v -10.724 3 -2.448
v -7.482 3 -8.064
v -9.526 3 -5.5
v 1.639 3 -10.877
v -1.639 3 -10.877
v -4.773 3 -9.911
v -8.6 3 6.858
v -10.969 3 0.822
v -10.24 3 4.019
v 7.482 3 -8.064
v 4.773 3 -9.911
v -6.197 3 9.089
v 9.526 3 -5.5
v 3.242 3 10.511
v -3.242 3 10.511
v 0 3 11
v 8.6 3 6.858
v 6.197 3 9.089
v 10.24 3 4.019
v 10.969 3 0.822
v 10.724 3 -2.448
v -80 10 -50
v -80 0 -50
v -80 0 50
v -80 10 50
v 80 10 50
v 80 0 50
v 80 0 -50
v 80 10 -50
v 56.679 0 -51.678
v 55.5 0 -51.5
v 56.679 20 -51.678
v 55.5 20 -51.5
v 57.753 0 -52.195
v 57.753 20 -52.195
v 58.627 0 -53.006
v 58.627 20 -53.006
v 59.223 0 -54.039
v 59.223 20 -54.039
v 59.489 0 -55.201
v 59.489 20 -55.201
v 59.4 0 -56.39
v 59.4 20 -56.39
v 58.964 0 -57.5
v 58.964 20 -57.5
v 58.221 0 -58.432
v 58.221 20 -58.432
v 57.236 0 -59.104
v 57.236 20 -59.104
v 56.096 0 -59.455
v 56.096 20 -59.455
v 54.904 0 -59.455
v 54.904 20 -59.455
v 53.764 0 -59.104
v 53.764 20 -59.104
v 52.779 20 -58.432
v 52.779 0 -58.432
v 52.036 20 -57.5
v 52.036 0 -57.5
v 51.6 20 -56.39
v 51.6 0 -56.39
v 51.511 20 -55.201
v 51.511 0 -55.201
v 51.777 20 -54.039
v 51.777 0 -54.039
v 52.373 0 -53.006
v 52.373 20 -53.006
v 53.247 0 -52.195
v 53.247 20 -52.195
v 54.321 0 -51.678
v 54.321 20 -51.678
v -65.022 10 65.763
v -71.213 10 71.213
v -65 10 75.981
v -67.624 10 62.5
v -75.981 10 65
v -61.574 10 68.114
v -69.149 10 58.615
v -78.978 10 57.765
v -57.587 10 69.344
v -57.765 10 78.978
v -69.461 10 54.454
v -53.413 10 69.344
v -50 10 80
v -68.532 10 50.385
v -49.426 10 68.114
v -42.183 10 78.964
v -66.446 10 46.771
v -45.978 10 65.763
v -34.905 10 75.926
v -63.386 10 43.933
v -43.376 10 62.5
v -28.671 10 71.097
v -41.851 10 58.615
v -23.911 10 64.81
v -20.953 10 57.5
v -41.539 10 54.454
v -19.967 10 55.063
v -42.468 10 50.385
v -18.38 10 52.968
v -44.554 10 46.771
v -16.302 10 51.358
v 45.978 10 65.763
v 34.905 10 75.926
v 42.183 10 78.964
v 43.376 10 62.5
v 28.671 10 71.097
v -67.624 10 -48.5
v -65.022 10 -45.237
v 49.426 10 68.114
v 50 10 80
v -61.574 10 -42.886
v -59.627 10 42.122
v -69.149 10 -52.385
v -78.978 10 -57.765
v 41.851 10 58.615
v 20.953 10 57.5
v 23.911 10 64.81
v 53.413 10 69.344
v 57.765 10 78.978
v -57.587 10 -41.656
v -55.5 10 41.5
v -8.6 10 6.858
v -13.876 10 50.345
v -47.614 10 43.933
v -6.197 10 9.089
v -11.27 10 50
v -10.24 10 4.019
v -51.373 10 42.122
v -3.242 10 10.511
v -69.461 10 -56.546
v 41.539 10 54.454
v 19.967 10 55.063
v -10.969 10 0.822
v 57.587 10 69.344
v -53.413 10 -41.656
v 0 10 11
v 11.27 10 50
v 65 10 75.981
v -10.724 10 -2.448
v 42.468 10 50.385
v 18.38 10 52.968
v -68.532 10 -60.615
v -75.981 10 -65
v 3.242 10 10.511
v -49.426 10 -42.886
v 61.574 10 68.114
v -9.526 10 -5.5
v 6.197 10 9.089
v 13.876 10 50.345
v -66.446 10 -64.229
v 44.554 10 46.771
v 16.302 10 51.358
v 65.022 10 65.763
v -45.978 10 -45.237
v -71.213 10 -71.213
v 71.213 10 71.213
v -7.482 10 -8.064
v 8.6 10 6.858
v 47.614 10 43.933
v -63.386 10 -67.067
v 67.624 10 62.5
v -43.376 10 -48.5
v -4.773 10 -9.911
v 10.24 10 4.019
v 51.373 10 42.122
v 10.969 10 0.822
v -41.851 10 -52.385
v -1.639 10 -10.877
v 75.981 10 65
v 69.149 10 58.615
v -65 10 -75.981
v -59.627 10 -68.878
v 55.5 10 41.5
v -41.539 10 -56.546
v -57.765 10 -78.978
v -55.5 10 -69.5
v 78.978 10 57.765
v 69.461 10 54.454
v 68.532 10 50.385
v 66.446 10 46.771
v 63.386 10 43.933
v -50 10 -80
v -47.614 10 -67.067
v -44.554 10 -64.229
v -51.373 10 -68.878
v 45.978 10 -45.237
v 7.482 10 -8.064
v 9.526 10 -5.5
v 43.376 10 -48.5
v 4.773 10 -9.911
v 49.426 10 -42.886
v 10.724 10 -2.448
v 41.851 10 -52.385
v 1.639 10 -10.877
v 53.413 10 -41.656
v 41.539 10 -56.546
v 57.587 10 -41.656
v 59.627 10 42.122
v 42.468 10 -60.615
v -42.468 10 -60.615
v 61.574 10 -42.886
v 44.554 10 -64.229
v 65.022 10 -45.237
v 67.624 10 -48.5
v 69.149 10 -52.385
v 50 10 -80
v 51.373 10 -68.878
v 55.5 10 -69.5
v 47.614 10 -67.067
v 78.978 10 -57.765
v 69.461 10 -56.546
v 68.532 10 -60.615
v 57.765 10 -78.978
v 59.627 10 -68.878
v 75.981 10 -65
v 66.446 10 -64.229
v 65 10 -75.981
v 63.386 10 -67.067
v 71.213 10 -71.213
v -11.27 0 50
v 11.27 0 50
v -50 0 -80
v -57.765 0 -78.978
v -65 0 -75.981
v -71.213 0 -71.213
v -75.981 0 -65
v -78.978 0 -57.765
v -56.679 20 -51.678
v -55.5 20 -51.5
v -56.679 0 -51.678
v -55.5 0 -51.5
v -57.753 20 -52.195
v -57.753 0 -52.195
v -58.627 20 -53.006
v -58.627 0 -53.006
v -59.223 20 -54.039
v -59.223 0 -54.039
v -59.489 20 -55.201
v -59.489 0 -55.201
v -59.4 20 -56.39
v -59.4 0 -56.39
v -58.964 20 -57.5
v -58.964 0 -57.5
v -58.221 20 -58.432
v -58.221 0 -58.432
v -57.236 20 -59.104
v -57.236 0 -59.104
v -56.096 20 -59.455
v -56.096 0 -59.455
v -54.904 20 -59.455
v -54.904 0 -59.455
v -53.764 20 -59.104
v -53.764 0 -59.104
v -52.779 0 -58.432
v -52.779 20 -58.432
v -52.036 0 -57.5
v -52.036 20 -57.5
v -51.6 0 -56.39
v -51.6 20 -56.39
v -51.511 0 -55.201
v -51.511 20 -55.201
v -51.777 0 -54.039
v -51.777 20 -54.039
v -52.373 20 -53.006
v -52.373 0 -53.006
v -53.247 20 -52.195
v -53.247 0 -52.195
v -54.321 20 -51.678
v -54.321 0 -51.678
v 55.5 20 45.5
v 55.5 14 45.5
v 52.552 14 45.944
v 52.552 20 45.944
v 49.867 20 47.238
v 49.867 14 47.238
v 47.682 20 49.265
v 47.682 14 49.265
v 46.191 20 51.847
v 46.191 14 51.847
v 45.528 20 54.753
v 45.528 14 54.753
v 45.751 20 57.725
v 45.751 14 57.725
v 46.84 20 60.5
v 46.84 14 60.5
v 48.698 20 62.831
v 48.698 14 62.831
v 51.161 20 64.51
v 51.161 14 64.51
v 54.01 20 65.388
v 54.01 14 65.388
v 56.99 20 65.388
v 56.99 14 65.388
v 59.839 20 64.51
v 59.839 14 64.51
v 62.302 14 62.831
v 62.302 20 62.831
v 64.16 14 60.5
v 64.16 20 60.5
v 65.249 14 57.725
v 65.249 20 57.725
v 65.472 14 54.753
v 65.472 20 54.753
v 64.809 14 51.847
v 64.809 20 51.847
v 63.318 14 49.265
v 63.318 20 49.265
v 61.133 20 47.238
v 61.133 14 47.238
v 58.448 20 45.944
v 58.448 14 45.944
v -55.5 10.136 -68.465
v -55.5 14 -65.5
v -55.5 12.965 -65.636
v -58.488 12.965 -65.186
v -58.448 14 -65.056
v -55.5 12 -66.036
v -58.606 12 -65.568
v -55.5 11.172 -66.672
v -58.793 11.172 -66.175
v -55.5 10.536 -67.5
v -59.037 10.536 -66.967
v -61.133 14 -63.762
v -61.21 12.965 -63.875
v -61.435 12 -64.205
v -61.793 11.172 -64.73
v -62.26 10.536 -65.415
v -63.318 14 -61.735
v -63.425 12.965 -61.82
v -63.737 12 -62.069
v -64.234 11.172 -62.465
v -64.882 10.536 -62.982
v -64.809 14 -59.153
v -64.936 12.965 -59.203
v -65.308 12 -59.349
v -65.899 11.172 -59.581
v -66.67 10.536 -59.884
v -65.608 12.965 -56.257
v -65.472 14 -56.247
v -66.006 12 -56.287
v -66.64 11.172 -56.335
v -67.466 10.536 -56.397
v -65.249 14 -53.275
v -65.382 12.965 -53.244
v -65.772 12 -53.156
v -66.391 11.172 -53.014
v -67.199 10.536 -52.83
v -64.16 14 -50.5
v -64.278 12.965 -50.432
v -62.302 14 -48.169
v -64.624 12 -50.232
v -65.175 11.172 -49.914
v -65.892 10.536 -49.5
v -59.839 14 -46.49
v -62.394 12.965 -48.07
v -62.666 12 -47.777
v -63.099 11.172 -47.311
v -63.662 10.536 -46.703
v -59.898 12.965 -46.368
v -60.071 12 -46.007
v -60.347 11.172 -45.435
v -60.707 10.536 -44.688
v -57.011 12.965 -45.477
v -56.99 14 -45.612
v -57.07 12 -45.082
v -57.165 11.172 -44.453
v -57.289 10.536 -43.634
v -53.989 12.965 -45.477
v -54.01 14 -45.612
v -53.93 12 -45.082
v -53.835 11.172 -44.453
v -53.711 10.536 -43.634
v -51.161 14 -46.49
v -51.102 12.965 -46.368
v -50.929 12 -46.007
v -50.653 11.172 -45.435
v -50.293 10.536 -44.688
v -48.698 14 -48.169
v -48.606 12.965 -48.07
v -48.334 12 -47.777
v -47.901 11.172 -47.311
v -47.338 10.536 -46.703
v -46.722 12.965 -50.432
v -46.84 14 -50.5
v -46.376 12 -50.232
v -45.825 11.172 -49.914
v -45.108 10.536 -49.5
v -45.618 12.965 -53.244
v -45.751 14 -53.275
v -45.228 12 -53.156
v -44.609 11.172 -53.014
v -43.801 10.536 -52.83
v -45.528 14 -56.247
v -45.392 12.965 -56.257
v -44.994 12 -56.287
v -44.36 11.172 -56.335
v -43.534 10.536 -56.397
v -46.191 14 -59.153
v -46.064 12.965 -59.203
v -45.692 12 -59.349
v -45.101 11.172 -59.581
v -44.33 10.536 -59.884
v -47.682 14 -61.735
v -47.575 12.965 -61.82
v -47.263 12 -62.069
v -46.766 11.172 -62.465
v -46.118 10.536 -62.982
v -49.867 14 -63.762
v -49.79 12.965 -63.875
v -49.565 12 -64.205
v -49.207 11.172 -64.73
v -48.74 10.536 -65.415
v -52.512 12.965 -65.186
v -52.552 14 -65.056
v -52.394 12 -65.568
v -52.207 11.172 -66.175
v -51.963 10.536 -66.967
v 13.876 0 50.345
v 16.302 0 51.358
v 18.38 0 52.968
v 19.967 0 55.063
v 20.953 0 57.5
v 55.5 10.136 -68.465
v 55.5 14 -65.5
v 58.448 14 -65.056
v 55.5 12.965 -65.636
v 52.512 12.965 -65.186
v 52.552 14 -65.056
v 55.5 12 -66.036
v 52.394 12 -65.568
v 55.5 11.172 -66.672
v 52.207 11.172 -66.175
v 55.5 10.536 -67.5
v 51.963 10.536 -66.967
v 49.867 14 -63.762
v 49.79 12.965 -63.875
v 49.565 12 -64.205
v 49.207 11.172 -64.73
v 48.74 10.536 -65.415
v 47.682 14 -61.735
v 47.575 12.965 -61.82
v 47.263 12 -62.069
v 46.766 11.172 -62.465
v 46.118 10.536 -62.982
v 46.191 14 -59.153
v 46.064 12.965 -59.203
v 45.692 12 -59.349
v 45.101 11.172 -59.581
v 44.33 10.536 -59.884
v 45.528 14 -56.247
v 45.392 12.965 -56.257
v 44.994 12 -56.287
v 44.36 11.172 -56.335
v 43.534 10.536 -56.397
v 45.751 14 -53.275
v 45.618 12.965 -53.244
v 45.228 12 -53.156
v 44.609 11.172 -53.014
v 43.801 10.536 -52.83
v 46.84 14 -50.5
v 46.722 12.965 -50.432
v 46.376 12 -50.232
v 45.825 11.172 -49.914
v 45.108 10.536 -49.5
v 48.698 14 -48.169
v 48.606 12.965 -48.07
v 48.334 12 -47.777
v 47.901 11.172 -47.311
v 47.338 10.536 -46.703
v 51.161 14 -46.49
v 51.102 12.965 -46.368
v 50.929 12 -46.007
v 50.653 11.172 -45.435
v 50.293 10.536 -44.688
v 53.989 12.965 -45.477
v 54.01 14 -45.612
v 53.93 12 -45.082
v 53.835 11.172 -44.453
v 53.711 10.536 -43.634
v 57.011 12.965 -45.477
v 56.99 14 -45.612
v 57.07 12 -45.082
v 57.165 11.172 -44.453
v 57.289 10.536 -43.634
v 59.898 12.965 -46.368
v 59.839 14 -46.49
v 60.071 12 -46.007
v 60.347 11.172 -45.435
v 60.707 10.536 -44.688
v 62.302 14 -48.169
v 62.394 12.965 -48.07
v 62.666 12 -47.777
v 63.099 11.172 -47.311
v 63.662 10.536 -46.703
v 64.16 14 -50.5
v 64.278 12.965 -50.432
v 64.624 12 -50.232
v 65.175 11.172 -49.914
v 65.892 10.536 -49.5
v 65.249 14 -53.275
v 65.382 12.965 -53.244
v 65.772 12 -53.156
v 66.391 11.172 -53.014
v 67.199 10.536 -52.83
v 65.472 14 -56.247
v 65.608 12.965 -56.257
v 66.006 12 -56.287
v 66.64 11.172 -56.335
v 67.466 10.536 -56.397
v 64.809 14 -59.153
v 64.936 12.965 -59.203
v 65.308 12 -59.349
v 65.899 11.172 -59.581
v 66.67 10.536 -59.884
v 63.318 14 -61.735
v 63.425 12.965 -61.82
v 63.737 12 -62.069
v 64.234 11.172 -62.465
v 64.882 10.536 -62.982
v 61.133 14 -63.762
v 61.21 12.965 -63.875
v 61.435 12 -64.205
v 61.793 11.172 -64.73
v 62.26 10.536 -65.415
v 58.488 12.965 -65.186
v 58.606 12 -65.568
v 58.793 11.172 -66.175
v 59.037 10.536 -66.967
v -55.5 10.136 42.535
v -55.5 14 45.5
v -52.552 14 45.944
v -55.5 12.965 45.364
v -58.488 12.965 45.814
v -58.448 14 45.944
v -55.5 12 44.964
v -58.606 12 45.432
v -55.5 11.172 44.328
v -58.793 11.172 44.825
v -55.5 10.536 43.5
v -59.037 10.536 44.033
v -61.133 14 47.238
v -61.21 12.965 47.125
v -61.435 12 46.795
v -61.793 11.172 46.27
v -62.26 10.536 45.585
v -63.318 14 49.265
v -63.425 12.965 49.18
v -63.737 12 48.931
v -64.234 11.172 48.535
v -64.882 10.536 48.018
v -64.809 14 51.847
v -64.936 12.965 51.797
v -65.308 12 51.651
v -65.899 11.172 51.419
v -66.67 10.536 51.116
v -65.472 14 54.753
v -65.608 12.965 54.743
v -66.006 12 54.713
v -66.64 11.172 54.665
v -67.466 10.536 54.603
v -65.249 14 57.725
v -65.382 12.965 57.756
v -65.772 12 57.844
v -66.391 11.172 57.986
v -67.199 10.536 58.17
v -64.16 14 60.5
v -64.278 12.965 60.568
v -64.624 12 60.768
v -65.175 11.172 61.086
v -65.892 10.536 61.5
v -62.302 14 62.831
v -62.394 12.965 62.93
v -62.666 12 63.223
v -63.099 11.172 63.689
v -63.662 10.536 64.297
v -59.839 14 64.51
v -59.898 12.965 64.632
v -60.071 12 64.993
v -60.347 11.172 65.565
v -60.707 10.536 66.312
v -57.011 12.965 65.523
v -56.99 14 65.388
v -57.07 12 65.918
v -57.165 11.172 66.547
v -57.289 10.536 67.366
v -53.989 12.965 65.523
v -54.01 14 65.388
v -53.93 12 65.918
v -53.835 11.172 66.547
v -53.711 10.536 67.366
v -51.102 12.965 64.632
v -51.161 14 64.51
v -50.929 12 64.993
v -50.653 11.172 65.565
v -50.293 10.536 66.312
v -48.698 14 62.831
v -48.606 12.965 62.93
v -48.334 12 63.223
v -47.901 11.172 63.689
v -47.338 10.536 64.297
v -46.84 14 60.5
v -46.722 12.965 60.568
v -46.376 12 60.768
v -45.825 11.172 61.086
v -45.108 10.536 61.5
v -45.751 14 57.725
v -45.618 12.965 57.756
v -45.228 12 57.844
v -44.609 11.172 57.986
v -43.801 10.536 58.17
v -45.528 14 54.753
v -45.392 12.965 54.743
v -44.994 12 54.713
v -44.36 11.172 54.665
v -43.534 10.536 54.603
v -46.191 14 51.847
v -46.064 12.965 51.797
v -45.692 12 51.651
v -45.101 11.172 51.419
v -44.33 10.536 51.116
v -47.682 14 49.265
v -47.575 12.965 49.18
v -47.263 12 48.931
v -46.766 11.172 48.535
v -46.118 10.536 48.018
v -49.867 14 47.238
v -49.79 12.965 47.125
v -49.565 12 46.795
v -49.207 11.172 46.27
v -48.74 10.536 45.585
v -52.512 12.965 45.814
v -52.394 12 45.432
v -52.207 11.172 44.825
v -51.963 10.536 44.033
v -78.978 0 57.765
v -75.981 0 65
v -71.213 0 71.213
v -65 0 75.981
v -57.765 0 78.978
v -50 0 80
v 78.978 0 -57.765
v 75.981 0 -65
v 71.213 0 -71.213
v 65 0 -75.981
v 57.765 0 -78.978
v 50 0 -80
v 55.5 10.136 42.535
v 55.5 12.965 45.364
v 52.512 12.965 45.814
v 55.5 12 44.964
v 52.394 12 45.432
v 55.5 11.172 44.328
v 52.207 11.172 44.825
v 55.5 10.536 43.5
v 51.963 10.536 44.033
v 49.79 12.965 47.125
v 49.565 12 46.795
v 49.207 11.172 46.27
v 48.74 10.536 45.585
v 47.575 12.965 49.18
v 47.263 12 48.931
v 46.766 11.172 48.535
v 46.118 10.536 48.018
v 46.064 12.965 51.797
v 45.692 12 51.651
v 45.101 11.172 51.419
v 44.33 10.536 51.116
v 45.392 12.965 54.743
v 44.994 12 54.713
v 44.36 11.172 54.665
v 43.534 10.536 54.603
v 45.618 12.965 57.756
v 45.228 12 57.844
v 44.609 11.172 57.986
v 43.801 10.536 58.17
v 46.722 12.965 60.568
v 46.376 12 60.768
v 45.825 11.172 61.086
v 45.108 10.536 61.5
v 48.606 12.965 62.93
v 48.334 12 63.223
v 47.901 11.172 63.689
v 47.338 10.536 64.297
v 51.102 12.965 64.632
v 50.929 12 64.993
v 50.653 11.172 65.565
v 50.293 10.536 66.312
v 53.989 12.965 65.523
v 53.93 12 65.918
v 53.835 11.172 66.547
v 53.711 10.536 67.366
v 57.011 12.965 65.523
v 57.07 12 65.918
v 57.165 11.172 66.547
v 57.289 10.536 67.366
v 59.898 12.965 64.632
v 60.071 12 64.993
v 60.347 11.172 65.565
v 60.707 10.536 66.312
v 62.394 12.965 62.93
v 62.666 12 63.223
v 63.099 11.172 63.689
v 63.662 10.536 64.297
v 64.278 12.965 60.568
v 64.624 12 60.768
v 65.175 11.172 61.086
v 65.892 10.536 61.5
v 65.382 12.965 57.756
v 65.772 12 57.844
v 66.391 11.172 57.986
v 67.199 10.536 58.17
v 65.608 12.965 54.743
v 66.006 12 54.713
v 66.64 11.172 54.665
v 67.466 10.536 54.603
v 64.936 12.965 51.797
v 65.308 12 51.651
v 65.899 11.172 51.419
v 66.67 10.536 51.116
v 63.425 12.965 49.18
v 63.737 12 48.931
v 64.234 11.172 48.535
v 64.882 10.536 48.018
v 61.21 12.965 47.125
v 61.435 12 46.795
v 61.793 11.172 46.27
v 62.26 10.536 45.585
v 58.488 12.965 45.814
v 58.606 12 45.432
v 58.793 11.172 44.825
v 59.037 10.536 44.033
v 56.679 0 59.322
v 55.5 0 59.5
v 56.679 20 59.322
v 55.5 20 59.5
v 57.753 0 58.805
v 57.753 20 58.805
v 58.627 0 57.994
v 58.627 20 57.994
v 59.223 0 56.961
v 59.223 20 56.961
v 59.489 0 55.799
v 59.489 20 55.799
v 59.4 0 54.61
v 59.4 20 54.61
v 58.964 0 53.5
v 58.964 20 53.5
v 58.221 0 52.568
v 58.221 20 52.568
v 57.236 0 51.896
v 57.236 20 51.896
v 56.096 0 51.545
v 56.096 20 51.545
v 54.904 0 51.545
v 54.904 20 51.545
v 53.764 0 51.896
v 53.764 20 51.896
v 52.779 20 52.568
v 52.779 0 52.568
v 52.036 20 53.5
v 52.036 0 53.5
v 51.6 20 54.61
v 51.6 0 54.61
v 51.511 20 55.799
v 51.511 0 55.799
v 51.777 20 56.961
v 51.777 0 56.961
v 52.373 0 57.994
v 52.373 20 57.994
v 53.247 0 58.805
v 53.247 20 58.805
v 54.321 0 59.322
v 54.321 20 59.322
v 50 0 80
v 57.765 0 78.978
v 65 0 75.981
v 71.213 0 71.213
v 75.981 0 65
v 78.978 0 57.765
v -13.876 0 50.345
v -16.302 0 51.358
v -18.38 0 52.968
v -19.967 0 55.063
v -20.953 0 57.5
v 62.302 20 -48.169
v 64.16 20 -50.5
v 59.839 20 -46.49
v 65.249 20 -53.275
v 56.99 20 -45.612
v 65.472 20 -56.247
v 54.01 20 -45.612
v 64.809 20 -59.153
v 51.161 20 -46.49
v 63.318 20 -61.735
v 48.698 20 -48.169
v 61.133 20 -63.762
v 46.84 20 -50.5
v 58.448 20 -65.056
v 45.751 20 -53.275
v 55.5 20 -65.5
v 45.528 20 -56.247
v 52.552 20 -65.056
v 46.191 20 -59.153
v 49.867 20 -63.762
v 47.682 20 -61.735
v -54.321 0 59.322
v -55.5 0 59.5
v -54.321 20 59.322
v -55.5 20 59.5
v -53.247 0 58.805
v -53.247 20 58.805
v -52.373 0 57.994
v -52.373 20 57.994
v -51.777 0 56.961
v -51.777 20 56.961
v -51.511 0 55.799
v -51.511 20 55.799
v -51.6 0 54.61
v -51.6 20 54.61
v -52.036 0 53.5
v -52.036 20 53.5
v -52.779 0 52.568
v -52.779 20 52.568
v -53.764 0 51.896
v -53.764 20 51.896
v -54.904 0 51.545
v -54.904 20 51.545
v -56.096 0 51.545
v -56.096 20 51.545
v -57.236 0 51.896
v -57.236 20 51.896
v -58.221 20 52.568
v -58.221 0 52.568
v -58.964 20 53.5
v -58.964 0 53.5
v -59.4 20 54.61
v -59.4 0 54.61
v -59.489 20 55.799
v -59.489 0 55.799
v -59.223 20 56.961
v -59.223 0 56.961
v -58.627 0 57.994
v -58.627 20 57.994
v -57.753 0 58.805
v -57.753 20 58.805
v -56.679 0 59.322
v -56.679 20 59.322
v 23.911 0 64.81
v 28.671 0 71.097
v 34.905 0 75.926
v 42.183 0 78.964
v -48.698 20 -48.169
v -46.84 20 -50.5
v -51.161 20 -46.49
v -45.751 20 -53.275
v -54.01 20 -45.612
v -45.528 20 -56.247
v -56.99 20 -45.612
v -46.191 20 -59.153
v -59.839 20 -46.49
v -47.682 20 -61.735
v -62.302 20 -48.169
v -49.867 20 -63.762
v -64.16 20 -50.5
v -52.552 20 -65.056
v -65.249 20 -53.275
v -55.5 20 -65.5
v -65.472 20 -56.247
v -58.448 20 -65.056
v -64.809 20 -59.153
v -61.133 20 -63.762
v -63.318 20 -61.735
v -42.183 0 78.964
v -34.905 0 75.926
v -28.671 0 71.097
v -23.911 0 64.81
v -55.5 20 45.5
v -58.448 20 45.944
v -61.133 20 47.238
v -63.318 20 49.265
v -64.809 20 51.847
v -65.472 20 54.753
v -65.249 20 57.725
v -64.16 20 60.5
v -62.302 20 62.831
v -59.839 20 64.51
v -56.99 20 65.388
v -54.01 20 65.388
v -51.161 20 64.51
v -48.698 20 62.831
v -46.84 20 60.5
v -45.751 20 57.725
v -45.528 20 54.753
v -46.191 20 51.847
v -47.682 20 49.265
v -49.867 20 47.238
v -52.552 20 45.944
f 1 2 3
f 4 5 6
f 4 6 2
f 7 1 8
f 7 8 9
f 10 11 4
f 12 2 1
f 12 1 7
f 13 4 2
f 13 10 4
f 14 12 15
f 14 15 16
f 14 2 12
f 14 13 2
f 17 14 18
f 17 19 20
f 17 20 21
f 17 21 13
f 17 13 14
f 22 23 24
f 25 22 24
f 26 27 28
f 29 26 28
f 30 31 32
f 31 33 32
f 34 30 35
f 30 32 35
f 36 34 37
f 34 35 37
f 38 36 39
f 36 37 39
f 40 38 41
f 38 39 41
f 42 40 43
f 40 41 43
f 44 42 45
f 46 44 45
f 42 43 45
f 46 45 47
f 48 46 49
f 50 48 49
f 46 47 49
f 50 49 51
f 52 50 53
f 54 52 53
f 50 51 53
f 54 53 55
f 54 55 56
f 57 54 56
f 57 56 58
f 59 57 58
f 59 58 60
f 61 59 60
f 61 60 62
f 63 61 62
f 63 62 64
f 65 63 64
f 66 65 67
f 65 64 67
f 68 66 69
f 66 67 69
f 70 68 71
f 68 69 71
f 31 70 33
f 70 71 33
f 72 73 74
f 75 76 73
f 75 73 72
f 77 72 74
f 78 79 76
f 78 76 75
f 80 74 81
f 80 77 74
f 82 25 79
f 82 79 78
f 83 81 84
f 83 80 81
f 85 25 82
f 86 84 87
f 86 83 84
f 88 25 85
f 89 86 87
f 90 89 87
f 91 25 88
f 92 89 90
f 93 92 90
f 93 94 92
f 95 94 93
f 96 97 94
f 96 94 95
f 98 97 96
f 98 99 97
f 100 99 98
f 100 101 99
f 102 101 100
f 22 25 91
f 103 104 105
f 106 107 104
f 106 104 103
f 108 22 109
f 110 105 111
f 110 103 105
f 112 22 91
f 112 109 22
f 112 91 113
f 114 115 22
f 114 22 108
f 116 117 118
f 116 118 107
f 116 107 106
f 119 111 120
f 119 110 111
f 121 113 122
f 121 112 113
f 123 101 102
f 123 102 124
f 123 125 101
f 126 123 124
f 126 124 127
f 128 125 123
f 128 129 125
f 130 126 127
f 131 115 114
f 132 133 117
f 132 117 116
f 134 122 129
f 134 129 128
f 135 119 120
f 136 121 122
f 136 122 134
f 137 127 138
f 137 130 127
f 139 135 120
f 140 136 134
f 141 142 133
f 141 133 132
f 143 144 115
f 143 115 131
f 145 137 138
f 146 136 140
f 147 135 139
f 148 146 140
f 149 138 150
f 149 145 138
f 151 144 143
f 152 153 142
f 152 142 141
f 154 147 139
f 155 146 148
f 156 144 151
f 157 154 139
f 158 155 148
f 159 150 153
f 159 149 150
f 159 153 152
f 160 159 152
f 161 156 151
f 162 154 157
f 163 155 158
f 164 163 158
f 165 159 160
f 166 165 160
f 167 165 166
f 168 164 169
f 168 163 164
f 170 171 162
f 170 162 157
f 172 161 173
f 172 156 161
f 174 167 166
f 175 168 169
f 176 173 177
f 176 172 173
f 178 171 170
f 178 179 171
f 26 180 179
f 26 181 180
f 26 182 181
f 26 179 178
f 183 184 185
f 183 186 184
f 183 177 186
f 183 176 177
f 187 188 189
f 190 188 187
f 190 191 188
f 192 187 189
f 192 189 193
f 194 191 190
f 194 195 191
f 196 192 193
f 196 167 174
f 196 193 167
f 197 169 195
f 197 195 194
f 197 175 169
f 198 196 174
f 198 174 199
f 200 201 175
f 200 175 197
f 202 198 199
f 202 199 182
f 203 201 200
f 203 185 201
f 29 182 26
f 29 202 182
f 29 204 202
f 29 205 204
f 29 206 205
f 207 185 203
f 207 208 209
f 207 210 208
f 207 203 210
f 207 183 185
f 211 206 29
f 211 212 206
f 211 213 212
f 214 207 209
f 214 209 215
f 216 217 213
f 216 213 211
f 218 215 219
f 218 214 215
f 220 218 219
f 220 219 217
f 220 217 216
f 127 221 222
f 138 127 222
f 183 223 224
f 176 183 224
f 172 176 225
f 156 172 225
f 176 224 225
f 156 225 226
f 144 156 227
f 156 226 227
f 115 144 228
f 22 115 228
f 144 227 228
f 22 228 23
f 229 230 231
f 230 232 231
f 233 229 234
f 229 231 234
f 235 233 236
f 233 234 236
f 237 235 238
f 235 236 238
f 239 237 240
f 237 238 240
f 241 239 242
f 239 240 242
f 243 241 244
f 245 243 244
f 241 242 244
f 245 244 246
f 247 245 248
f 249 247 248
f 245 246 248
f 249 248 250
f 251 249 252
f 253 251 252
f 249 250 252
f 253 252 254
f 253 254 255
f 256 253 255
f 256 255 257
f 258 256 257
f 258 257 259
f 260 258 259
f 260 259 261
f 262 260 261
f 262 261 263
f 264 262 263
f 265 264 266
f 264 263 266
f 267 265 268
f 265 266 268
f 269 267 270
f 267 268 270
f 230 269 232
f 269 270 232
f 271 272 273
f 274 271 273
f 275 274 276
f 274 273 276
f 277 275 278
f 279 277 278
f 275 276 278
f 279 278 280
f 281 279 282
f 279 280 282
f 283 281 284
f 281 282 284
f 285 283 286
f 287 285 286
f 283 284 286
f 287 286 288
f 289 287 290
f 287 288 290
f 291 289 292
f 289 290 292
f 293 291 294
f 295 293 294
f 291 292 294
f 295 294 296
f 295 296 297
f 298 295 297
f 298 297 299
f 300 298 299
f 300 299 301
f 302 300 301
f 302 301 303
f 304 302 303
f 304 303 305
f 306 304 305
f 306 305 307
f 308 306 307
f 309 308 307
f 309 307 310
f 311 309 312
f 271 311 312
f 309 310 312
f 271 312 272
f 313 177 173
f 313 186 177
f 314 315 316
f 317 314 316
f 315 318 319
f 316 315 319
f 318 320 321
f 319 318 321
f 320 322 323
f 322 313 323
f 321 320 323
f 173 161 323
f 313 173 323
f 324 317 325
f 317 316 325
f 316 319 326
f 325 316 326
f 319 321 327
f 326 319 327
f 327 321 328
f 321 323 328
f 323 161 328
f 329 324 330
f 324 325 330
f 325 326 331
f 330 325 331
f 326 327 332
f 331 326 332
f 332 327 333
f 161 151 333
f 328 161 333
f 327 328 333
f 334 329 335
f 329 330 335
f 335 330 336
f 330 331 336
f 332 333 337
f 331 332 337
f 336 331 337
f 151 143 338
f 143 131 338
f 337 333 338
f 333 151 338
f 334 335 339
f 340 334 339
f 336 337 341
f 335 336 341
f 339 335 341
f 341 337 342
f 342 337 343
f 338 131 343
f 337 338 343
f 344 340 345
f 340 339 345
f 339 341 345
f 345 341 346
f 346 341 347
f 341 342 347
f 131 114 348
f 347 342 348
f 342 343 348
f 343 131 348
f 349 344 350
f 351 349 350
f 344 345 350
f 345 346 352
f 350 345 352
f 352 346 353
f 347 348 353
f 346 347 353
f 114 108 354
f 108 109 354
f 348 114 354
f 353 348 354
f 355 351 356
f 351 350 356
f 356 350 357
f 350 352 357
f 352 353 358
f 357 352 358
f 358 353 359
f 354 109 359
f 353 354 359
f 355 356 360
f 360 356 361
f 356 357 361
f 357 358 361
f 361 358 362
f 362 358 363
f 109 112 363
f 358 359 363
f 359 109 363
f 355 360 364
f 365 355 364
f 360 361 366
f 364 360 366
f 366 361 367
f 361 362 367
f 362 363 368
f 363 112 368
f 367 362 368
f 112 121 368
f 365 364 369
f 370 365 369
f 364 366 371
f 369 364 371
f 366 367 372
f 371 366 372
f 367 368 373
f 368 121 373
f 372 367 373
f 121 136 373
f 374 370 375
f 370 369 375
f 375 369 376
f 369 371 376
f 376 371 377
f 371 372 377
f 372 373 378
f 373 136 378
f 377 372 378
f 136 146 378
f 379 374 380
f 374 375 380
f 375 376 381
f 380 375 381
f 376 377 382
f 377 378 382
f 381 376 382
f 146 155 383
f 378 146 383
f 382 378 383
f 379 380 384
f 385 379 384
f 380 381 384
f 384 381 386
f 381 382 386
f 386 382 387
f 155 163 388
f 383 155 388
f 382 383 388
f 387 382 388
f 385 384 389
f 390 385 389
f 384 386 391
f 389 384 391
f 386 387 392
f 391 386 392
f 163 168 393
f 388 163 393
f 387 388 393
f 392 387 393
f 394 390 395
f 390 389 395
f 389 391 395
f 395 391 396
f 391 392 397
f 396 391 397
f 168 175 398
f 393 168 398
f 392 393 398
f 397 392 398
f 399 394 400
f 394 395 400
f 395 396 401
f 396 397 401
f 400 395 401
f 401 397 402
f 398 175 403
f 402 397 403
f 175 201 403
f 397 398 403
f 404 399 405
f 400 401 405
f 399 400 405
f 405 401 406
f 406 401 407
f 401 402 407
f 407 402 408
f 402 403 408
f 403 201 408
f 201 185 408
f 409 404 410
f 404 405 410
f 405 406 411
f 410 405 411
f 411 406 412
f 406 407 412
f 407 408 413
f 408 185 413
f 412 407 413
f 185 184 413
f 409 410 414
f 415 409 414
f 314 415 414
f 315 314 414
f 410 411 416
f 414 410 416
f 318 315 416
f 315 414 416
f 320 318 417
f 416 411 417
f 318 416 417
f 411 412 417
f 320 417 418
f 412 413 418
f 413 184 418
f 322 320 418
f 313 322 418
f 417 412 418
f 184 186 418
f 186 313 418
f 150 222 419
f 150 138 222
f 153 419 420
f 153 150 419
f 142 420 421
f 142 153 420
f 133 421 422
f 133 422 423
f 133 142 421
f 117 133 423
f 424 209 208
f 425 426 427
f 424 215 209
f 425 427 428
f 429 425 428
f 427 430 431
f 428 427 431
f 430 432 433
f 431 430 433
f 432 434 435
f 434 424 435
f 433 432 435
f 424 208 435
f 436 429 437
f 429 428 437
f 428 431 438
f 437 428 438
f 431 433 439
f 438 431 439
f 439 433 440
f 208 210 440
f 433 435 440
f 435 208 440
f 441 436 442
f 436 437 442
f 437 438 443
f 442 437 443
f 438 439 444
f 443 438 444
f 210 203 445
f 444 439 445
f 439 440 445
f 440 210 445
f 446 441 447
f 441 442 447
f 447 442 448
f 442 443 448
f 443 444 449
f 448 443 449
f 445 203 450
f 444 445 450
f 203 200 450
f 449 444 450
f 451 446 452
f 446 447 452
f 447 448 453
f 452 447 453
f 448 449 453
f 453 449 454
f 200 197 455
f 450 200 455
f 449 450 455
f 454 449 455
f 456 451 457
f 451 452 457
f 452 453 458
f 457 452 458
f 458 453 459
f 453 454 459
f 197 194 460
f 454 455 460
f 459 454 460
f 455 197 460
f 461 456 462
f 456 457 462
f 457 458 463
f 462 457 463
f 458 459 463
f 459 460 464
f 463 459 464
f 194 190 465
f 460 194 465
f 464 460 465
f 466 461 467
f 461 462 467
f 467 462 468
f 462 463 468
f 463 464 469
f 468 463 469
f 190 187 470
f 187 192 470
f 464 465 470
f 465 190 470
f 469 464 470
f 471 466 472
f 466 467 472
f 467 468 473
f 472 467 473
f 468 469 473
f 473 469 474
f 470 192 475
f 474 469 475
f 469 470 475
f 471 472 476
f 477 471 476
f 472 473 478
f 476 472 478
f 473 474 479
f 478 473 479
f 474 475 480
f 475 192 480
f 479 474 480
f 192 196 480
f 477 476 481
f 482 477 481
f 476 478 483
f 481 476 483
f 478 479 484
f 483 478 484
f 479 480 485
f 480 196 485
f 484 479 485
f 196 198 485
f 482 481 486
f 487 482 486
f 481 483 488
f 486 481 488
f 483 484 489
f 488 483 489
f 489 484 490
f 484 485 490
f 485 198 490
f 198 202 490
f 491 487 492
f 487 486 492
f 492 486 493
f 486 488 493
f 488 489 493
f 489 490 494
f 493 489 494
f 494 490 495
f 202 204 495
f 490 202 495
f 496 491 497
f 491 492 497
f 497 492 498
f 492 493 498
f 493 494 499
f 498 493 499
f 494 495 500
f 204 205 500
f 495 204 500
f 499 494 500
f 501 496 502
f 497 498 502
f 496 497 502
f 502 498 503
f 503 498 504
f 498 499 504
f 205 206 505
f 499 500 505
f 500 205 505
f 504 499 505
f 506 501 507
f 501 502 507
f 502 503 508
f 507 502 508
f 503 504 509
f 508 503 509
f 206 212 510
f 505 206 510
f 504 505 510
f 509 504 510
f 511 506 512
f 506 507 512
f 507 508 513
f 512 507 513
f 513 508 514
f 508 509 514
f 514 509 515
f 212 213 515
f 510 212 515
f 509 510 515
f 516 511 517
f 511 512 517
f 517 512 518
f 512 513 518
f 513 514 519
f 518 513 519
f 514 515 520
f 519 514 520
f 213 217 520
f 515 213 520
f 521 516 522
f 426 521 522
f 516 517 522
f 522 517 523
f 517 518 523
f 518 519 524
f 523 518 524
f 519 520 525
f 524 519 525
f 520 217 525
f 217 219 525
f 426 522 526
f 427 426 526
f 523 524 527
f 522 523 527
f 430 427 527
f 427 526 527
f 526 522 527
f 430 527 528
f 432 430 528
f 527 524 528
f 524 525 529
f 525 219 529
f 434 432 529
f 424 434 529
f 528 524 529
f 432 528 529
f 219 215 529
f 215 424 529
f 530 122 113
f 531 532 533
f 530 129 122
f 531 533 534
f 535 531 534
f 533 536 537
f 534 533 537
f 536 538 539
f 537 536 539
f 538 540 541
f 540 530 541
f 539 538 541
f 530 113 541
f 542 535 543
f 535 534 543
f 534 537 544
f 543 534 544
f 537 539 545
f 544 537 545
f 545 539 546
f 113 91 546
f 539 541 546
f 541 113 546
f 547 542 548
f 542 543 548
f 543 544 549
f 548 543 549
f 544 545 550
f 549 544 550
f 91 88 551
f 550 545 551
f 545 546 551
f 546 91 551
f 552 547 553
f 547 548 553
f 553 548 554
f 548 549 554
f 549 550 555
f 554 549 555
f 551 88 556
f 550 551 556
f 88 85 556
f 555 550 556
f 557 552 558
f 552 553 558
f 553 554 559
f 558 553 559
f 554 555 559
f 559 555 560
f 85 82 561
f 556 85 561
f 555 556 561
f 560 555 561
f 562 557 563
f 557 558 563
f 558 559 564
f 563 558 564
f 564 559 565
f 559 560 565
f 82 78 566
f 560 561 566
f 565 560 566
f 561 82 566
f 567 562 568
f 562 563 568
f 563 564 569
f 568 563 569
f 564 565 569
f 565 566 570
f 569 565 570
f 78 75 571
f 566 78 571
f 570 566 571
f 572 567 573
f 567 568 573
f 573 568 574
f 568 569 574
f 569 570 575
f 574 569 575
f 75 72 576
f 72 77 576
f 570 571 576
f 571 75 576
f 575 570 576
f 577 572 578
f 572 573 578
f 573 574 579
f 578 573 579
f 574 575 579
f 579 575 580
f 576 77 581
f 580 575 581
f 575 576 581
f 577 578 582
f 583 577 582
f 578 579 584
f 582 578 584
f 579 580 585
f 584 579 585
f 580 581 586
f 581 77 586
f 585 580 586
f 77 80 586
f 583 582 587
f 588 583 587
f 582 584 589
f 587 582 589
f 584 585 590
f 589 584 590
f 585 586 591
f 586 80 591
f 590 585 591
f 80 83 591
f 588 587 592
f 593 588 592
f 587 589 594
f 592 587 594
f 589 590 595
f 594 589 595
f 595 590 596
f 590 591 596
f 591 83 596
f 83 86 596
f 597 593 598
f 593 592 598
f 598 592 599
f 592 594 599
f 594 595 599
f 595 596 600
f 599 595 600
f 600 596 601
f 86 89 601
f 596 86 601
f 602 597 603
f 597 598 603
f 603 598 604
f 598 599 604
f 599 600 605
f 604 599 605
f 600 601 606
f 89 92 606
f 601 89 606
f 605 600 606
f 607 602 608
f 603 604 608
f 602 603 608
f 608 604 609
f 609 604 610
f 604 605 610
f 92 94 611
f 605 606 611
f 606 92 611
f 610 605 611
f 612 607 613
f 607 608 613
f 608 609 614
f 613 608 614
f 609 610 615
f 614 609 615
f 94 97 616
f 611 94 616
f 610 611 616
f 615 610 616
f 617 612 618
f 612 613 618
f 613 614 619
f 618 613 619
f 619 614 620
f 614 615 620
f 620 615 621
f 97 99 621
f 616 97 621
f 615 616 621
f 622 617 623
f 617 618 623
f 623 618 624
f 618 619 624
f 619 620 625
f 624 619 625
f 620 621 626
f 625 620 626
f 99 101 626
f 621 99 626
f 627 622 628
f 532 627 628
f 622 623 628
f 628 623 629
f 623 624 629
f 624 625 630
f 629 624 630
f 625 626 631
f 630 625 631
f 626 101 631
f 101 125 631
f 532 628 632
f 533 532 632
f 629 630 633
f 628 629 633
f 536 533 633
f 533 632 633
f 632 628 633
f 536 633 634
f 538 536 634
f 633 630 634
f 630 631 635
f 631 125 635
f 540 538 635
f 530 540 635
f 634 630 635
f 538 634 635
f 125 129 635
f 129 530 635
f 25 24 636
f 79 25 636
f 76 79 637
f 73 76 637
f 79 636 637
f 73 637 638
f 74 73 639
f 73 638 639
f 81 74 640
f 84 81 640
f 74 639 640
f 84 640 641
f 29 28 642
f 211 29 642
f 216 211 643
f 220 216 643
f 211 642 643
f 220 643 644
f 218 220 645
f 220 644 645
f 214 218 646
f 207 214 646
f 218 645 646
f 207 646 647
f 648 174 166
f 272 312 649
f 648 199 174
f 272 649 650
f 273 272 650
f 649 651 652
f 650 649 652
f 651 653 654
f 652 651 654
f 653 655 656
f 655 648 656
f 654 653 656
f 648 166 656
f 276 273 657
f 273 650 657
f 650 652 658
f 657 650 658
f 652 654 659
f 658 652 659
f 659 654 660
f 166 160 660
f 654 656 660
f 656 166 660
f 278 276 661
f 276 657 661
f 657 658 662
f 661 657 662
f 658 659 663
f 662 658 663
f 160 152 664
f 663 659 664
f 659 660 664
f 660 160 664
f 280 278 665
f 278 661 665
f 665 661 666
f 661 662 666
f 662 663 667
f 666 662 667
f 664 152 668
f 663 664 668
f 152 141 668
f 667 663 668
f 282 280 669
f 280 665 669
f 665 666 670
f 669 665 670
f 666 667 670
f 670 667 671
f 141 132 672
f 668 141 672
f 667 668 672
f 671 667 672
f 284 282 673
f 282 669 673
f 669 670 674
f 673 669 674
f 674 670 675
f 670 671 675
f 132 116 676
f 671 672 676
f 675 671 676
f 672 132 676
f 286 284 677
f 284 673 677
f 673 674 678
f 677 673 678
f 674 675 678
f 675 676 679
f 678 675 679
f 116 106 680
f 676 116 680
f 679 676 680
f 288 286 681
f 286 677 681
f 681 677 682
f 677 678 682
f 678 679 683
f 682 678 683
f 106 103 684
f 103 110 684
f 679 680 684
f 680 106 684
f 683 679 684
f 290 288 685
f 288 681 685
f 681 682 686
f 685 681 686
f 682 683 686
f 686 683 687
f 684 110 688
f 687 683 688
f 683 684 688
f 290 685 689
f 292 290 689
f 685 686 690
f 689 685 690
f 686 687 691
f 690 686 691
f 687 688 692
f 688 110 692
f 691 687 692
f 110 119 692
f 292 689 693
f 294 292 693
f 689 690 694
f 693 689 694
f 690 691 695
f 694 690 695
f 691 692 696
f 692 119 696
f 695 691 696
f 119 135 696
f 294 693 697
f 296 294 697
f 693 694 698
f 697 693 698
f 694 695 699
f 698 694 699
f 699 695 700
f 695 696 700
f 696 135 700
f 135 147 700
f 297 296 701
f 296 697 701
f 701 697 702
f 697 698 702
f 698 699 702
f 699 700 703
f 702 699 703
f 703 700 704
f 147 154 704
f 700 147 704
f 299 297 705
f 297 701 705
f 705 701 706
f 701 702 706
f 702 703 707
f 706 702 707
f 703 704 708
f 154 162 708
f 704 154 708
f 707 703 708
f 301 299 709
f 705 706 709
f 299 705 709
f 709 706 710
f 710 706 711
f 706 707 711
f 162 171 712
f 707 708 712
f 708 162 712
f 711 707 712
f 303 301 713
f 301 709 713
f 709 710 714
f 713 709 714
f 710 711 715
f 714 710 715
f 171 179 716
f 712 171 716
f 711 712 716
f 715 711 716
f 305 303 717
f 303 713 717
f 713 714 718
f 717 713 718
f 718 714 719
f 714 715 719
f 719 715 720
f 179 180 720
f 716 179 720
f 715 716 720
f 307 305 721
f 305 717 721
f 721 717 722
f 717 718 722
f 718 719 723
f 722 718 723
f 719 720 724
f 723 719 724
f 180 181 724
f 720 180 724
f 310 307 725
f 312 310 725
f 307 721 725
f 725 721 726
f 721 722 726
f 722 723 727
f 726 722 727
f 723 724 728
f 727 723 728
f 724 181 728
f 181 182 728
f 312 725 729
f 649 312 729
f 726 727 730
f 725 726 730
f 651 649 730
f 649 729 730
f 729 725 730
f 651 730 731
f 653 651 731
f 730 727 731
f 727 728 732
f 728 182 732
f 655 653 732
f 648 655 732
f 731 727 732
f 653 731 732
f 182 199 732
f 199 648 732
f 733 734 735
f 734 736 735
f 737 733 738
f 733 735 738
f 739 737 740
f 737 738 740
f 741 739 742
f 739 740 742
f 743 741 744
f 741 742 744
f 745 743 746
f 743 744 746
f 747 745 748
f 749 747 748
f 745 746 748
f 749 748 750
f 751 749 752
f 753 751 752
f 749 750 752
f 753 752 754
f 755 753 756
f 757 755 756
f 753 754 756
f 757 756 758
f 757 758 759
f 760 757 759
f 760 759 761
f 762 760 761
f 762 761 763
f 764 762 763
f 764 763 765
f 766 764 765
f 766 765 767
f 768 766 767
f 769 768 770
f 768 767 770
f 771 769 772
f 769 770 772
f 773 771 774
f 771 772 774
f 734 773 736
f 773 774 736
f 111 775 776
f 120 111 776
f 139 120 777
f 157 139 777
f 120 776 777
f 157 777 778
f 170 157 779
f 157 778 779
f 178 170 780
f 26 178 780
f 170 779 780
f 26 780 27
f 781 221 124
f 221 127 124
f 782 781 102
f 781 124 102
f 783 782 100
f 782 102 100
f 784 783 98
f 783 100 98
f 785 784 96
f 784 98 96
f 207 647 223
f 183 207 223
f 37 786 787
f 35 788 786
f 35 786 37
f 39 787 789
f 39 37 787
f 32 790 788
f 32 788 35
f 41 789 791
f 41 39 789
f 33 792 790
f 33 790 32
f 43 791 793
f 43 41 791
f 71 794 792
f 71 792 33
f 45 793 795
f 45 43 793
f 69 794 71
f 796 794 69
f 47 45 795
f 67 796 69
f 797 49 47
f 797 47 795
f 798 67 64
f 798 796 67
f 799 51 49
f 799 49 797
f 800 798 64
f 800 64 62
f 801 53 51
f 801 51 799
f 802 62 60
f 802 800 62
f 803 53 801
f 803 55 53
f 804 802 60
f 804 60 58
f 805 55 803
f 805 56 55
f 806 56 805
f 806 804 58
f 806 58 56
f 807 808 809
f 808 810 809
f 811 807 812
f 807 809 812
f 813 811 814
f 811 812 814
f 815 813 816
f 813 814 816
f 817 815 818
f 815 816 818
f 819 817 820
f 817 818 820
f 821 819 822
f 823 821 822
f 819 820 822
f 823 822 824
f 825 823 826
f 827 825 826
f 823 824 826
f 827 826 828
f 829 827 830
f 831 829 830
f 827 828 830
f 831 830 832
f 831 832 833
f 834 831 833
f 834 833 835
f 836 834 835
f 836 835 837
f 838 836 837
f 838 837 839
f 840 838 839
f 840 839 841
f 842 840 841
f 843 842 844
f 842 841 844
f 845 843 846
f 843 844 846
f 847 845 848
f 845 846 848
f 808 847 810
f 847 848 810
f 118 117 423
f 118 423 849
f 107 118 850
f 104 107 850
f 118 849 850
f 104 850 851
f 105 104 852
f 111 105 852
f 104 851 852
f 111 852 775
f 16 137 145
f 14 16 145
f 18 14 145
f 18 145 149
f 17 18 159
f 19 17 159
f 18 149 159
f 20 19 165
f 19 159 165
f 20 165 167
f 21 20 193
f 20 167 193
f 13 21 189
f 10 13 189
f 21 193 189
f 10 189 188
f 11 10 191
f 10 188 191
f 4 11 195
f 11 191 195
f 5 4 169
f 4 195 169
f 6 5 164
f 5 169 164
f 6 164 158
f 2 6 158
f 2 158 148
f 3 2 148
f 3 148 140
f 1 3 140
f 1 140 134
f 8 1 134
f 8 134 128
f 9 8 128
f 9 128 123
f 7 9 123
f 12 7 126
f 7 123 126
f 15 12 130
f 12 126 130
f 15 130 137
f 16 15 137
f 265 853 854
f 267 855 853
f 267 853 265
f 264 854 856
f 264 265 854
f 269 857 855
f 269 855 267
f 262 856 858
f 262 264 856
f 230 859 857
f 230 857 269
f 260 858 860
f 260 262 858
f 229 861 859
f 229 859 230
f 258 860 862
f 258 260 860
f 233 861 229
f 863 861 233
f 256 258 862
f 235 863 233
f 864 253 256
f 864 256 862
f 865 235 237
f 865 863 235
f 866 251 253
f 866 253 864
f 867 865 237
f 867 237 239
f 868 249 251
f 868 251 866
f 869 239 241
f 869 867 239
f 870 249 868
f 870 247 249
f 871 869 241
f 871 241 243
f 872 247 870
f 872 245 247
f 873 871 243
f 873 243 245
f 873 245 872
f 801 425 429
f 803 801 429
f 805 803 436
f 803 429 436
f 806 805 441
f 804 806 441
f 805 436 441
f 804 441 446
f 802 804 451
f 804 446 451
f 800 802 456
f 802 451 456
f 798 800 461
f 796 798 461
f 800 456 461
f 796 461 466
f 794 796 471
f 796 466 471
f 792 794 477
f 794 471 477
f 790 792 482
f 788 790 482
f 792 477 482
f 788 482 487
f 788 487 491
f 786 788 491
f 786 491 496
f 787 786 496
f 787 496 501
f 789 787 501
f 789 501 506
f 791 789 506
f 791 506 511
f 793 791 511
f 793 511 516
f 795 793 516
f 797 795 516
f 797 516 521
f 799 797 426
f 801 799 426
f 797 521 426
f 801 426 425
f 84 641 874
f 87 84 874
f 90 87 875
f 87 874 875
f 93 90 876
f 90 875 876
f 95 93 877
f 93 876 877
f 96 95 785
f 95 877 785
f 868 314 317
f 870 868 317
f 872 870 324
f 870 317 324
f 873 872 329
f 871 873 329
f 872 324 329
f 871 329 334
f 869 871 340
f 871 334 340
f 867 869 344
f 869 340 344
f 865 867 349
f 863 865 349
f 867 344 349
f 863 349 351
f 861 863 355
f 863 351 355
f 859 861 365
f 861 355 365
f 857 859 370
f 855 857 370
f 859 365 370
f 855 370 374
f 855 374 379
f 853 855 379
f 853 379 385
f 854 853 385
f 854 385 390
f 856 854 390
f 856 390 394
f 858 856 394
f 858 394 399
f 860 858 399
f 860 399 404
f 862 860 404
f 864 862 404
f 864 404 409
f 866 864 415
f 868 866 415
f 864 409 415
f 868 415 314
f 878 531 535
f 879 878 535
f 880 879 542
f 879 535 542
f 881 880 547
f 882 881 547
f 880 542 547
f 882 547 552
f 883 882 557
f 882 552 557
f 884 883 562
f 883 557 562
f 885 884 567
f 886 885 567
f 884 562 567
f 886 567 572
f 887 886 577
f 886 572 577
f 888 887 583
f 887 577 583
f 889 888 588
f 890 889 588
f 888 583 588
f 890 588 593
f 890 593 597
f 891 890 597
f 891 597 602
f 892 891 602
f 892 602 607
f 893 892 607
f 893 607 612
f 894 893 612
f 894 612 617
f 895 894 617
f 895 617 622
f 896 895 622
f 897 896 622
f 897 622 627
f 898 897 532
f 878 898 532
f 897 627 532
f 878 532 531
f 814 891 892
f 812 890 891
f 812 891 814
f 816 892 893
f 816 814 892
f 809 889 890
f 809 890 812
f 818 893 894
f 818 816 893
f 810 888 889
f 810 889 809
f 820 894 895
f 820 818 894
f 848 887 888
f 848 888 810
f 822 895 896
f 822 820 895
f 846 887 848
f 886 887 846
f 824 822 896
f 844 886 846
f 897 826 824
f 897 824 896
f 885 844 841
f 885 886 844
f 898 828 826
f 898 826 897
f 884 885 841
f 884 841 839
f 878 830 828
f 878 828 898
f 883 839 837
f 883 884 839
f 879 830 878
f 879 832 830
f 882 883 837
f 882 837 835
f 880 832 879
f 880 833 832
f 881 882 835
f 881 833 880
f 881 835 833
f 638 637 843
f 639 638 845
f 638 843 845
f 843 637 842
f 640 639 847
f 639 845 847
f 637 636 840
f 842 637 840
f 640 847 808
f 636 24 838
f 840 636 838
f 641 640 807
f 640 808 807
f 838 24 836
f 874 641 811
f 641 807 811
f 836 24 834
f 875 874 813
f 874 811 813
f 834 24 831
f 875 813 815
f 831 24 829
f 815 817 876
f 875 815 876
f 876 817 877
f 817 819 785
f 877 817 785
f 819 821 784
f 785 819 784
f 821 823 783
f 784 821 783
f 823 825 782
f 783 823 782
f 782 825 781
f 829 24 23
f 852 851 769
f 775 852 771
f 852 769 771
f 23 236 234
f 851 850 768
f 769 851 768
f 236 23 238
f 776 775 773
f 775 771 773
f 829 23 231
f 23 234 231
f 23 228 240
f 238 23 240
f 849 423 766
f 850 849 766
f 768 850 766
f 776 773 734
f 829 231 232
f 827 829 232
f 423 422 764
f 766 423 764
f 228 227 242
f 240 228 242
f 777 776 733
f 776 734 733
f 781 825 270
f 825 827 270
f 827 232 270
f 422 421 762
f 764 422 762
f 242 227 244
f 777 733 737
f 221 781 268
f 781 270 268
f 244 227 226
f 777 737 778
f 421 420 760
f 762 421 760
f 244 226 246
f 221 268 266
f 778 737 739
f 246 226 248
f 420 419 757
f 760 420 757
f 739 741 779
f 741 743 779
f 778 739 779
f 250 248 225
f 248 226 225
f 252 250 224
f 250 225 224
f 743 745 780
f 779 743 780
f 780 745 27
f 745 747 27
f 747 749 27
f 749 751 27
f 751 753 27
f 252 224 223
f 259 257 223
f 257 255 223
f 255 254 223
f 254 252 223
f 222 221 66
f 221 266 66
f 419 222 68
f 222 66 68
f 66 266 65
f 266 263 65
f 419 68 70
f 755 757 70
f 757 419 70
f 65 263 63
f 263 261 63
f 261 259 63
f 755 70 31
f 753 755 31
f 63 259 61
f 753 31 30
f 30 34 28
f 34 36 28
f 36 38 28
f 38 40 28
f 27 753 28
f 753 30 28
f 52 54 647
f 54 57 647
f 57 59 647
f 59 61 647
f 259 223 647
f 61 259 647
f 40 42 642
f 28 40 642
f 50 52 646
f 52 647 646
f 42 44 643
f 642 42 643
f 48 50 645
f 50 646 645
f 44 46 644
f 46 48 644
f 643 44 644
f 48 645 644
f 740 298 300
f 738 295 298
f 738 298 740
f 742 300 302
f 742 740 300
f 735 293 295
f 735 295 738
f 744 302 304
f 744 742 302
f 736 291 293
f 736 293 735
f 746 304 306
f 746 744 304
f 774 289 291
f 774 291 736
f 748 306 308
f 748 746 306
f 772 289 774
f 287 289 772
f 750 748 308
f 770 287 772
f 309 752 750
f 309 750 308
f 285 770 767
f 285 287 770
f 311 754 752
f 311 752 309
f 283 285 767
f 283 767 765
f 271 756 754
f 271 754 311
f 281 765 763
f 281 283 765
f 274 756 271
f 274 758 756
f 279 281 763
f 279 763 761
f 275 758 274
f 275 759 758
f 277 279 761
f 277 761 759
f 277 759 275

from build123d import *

# Parameters (mm, degrees)
BOSS_EXTRUDE6_DEPTH = 10
FILLET4_R           = 10
SKETCH13_R          = 4
CUT_EXTRUDE5_DEPTH  = 114.578166916
SKETCH14_R          = 10
BOSS_EXTRUDE7_DEPTH = 10
SKETCH15_R          = 4
CUT_EXTRUDE6_DEPTH  = 114.578166916
FILLET5_R           = 4
SKETCH16_R          = 11
CUT_EXTRUDE7_DEPTH  = 7


with BuildPart() as part:
    # Sketch12 → Boss-Extrude6 (new body)
    with BuildSketch(Plane(origin=(0, 0, 0), x_dir=(1, 0, 0), z_dir=(0, 1, 0))):
        with BuildLine():
            Line((-20, -50), (20, -50))
            ThreePointArc((20, -50), (28.786796564, -71.213203436), (50, -80))
            ThreePointArc((50, -80), (71.213203436, -71.213203436), (80, -50))
            Line((80, -50), (80, 50))
            ThreePointArc((80, 50), (71.213203436, 71.213203436), (50, 80))
            Line((50, 80), (-50, 80))
            ThreePointArc((-50, 80), (-71.213203436, 71.213203436), (-80, 50))
            Line((-80, 50), (-80, -50))
            ThreePointArc((-80, -50), (-71.213203436, -71.213203436), (-50, -80))
            ThreePointArc((-50, -80), (-28.786796564, -71.213203436), (-20, -50))
        make_face()
    extrude(amount=BOSS_EXTRUDE6_DEPTH)

    # Fillet4
    fillet4_edges = [part.edges().sort_by_distance(p)[0] for p in [
        (20, 5, 50),
        (-20, 5, 50),
    ]]
    fillet(fillet4_edges, radius=FILLET4_R)

    # Sketch13 → Cut-Extrude5 (cut, through all)
    with BuildSketch(Plane(origin=(0, 10, 0), x_dir=(1, 0, 0), z_dir=(0, 1, 0))):
        with Locations(Location((-55.5, 55.5, 0), (0, 0, 270))):
            Circle(SKETCH13_R)
        with Locations(Location((55.5, 55.5, 0), (0, 0, 270))):
            Circle(SKETCH13_R)
        with Locations(Location((-55.5, -55.5, 0), (0, 0, 270))):
            Circle(SKETCH13_R)
        with Locations(Location((55.5, -55.5, 0), (0, 0, 270))):
            Circle(SKETCH13_R)
    extrude(amount=-CUT_EXTRUDE5_DEPTH, mode=Mode.SUBTRACT)

    # Sketch14 → Boss-Extrude7 (add)
    with BuildSketch(Plane(origin=(0, 10, 0), x_dir=(1, 0, 0), z_dir=(0, 1, 0))):
        with Locations(Location((-55.5, 55.5, 0), (0, 0, 90))):
            Circle(SKETCH14_R)
        with Locations(Location((55.5, 55.5, 0), (0, 0, 90))):
            Circle(SKETCH14_R)
        with Locations(Location((-55.5, -55.5, 0), (0, 0, 90))):
            Circle(SKETCH14_R)
        with Locations(Location((55.5, -55.5, 0), (0, 0, 90))):
            Circle(SKETCH14_R)
    extrude(amount=BOSS_EXTRUDE7_DEPTH)

    # Sketch15 → Cut-Extrude6 (cut, through all)
    with BuildSketch(Plane.XZ.offset(-10)):
        with Locations(Location((-55.5, -55.5, 0), (0, 0, 90))):
            Circle(SKETCH15_R)
        with Locations(Location((-55.5, 55.5, 0), (0, 0, 90))):
            Circle(SKETCH15_R)
        with Locations(Location((55.5, 55.5, 0), (0, 0, 90))):
            Circle(SKETCH15_R)
        with Locations(Location((55.5, -55.5, 0), (0, 0, 90))):
            Circle(SKETCH15_R)
    extrude(amount=-CUT_EXTRUDE6_DEPTH, mode=Mode.SUBTRACT)

    # Fillet5
    fillet5_edges = [part.edges().sort_by_distance(p)[0] for p in [
        (-55.5, 10, -45.5),
        (-55.5, 10, 65.5),
        (55.5, 10, 65.5),
        (55.5, 10, -45.5),
    ]]
    fillet(fillet5_edges, radius=FILLET5_R)

    # Sketch16 → Cut-Extrude7 (cut)
    with BuildSketch(Plane(origin=(0, 10, 0), x_dir=(1, 0, 0), z_dir=(0, 1, 0))):
        with Locations(Location((0, 0, 0), (0, 0, 270))):
            Circle(SKETCH16_R)
    extrude(amount=-CUT_EXTRUDE7_DEPTH, mode=Mode.SUBTRACT)


solid = part.part
